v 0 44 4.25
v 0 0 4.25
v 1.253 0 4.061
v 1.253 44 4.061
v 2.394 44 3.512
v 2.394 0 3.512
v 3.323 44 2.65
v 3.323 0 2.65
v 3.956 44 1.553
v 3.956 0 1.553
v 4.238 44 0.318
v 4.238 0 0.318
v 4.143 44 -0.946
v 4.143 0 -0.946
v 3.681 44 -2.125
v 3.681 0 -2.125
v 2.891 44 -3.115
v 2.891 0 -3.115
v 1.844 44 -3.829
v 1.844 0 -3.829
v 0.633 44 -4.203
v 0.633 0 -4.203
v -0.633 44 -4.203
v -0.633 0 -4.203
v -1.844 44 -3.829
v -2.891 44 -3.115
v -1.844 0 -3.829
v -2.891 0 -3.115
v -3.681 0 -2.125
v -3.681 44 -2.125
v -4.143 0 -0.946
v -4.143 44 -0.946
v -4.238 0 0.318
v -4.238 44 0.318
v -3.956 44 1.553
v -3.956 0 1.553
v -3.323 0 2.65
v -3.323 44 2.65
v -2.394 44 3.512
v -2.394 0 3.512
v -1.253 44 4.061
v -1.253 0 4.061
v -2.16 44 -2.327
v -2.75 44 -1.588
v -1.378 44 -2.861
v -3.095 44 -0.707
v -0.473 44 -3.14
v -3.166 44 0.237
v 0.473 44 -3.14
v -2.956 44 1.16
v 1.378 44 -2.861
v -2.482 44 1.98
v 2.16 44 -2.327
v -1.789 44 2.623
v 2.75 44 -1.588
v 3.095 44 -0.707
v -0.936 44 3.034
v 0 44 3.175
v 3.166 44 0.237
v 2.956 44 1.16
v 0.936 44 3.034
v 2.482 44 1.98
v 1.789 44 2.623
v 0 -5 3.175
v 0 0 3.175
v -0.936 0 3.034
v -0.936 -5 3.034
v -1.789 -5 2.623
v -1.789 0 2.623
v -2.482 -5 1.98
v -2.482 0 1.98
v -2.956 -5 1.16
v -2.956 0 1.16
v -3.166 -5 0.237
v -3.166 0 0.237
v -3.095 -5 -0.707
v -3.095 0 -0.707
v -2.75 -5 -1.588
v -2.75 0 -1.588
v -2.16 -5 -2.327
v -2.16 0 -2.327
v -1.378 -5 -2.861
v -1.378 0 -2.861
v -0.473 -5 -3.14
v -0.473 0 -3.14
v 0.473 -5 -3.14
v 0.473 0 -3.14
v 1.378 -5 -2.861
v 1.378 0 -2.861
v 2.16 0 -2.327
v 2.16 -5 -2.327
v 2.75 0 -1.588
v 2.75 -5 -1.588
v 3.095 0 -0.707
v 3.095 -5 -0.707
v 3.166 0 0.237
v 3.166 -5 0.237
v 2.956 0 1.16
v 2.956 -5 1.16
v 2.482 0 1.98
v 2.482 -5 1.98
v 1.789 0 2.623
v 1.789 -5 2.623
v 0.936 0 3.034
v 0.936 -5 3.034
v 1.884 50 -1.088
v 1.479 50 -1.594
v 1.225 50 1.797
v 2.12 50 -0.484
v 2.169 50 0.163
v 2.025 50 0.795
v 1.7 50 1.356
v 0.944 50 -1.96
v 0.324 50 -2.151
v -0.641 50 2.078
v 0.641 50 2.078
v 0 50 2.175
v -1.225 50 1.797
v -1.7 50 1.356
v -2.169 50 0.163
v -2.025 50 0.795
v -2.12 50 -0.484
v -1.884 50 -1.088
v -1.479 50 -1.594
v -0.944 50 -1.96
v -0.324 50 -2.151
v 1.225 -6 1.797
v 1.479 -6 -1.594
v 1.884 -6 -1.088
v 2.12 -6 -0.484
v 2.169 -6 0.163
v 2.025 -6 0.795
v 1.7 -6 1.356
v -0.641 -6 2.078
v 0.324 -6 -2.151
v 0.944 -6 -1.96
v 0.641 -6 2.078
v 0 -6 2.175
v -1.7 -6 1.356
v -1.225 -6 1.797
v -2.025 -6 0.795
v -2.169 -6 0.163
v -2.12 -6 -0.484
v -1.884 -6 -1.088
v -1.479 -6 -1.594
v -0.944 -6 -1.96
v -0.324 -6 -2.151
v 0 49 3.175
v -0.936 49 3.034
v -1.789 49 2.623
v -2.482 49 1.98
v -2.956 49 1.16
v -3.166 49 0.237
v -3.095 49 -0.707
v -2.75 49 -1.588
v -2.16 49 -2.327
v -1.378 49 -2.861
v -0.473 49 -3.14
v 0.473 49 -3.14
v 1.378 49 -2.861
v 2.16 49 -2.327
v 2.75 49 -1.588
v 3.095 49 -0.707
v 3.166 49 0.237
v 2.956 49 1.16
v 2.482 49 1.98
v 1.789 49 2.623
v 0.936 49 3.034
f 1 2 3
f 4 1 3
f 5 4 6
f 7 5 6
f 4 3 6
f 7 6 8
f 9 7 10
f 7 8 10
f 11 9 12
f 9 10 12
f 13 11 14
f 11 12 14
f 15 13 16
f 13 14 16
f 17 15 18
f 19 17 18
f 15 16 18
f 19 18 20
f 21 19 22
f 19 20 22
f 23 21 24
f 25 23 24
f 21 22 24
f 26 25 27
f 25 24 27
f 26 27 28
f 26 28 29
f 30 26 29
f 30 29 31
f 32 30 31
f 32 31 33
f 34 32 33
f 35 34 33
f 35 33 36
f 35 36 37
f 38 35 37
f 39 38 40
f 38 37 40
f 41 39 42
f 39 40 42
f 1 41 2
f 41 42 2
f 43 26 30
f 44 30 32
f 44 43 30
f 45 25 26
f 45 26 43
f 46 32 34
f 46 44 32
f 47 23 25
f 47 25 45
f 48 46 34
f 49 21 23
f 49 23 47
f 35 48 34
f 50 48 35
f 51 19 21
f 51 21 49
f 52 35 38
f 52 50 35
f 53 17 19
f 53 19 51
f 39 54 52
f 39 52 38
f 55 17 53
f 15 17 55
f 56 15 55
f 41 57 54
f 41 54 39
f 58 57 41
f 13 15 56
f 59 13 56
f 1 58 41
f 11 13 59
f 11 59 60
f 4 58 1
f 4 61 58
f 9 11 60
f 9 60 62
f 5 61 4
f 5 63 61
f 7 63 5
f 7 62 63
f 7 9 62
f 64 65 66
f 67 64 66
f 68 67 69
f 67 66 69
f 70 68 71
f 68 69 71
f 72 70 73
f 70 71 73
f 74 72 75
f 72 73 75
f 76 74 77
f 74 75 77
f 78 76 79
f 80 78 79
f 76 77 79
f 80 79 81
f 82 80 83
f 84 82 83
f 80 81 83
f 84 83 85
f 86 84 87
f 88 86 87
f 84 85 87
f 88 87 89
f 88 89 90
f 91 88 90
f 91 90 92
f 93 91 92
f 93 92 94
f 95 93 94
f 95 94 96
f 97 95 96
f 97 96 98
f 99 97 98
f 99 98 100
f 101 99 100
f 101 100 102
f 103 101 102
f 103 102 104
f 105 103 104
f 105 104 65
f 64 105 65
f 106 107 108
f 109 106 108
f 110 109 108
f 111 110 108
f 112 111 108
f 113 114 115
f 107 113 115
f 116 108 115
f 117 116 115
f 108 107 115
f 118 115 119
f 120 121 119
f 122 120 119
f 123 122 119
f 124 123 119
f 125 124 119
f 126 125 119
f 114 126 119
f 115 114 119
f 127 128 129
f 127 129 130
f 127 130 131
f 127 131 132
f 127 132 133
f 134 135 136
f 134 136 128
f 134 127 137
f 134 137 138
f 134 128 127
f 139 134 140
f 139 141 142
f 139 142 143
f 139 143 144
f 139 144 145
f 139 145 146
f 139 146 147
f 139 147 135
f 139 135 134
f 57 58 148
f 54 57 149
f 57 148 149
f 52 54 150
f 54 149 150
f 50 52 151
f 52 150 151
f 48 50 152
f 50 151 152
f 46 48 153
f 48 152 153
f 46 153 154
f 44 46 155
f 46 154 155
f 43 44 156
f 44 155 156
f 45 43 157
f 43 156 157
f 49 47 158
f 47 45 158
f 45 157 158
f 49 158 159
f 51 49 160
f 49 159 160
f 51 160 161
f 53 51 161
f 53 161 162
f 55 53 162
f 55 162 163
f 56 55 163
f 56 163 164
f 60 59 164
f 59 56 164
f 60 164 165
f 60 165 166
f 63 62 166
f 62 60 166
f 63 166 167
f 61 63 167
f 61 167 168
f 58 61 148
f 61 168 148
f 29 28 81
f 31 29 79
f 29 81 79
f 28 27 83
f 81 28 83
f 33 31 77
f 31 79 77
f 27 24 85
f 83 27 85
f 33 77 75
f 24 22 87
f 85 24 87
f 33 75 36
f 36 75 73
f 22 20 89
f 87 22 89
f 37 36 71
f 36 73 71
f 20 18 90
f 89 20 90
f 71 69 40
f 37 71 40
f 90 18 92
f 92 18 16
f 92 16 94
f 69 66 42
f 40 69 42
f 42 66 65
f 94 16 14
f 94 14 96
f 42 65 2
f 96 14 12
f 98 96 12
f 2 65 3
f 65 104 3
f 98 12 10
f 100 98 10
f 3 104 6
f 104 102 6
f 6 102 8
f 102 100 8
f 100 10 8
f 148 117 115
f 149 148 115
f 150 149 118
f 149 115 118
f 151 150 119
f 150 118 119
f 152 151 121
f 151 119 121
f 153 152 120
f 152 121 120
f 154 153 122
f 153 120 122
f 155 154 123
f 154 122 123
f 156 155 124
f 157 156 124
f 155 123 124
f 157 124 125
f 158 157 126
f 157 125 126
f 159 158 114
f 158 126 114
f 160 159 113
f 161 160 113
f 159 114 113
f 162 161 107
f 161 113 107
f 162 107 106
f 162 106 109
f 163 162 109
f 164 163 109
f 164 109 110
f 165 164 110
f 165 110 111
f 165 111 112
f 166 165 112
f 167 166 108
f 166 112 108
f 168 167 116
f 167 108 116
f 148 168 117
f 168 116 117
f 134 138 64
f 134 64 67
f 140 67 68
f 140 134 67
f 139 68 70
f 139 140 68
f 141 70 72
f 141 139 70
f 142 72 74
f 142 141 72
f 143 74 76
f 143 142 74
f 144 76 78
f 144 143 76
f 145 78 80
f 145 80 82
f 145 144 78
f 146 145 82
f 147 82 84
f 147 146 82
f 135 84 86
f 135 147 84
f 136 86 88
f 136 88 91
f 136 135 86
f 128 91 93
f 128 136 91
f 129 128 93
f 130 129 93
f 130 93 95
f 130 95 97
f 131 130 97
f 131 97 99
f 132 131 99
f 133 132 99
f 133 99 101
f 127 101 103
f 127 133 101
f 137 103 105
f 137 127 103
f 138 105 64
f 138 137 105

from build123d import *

# Parameters (mm, degrees)
ESBO_O1_R                     = 4.25
RESSALTO_EXTRUS_O1_DEPTH      = 44
RESSALTO_EXTRUS_O2_DEPTH      = 6
RESSALTO_EXTRUS_O2_DEPTH_BACK = 50
ESBO_O2_R                     = 3.175
CHANFRO1_SIZE                 = 1
CHANFRO2_SIZE                 = 1


with BuildPart() as part:
    # Esboço1 → Ressalto-extrusão1 (new body)
    with BuildSketch(Plane(origin=(0, 0, 0), x_dir=(1, 0, 0), z_dir=(0, 1, 0))):
        with Locations(Location((0, 0, 0), (0, 0, 270))):
            Circle(ESBO_O1_R)
    extrude(amount=RESSALTO_EXTRUS_O1_DEPTH)

    # Esboço2 → Ressalto-extrusão2 (add, two sides: drawn at the far end of the back side and taken through both)
    with BuildSketch(Plane(origin=(0, 0, 0), x_dir=(-1, 0, 0), z_dir=(0, -1, 0)).offset(-RESSALTO_EXTRUS_O2_DEPTH_BACK)):
        with Locations(Location((0, 0, 0), (0, 0, 270))):
            Circle(ESBO_O2_R)
    extrude(amount=RESSALTO_EXTRUS_O2_DEPTH + RESSALTO_EXTRUS_O2_DEPTH_BACK)

    # Chanfro1
    chanfro1_edges = [part.edges().sort_by_distance(p)[0] for p in [
        (0, -6, -3.175),
    ]]
    chamfer(chanfro1_edges, length=CHANFRO1_SIZE)

    # Chanfro2
    chanfro2_edges = [part.edges().sort_by_distance(p)[0] for p in [
        (0, 50, -3.175),
    ]]
    chamfer(chanfro2_edges, length=CHANFRO2_SIZE)


solid = part.part
